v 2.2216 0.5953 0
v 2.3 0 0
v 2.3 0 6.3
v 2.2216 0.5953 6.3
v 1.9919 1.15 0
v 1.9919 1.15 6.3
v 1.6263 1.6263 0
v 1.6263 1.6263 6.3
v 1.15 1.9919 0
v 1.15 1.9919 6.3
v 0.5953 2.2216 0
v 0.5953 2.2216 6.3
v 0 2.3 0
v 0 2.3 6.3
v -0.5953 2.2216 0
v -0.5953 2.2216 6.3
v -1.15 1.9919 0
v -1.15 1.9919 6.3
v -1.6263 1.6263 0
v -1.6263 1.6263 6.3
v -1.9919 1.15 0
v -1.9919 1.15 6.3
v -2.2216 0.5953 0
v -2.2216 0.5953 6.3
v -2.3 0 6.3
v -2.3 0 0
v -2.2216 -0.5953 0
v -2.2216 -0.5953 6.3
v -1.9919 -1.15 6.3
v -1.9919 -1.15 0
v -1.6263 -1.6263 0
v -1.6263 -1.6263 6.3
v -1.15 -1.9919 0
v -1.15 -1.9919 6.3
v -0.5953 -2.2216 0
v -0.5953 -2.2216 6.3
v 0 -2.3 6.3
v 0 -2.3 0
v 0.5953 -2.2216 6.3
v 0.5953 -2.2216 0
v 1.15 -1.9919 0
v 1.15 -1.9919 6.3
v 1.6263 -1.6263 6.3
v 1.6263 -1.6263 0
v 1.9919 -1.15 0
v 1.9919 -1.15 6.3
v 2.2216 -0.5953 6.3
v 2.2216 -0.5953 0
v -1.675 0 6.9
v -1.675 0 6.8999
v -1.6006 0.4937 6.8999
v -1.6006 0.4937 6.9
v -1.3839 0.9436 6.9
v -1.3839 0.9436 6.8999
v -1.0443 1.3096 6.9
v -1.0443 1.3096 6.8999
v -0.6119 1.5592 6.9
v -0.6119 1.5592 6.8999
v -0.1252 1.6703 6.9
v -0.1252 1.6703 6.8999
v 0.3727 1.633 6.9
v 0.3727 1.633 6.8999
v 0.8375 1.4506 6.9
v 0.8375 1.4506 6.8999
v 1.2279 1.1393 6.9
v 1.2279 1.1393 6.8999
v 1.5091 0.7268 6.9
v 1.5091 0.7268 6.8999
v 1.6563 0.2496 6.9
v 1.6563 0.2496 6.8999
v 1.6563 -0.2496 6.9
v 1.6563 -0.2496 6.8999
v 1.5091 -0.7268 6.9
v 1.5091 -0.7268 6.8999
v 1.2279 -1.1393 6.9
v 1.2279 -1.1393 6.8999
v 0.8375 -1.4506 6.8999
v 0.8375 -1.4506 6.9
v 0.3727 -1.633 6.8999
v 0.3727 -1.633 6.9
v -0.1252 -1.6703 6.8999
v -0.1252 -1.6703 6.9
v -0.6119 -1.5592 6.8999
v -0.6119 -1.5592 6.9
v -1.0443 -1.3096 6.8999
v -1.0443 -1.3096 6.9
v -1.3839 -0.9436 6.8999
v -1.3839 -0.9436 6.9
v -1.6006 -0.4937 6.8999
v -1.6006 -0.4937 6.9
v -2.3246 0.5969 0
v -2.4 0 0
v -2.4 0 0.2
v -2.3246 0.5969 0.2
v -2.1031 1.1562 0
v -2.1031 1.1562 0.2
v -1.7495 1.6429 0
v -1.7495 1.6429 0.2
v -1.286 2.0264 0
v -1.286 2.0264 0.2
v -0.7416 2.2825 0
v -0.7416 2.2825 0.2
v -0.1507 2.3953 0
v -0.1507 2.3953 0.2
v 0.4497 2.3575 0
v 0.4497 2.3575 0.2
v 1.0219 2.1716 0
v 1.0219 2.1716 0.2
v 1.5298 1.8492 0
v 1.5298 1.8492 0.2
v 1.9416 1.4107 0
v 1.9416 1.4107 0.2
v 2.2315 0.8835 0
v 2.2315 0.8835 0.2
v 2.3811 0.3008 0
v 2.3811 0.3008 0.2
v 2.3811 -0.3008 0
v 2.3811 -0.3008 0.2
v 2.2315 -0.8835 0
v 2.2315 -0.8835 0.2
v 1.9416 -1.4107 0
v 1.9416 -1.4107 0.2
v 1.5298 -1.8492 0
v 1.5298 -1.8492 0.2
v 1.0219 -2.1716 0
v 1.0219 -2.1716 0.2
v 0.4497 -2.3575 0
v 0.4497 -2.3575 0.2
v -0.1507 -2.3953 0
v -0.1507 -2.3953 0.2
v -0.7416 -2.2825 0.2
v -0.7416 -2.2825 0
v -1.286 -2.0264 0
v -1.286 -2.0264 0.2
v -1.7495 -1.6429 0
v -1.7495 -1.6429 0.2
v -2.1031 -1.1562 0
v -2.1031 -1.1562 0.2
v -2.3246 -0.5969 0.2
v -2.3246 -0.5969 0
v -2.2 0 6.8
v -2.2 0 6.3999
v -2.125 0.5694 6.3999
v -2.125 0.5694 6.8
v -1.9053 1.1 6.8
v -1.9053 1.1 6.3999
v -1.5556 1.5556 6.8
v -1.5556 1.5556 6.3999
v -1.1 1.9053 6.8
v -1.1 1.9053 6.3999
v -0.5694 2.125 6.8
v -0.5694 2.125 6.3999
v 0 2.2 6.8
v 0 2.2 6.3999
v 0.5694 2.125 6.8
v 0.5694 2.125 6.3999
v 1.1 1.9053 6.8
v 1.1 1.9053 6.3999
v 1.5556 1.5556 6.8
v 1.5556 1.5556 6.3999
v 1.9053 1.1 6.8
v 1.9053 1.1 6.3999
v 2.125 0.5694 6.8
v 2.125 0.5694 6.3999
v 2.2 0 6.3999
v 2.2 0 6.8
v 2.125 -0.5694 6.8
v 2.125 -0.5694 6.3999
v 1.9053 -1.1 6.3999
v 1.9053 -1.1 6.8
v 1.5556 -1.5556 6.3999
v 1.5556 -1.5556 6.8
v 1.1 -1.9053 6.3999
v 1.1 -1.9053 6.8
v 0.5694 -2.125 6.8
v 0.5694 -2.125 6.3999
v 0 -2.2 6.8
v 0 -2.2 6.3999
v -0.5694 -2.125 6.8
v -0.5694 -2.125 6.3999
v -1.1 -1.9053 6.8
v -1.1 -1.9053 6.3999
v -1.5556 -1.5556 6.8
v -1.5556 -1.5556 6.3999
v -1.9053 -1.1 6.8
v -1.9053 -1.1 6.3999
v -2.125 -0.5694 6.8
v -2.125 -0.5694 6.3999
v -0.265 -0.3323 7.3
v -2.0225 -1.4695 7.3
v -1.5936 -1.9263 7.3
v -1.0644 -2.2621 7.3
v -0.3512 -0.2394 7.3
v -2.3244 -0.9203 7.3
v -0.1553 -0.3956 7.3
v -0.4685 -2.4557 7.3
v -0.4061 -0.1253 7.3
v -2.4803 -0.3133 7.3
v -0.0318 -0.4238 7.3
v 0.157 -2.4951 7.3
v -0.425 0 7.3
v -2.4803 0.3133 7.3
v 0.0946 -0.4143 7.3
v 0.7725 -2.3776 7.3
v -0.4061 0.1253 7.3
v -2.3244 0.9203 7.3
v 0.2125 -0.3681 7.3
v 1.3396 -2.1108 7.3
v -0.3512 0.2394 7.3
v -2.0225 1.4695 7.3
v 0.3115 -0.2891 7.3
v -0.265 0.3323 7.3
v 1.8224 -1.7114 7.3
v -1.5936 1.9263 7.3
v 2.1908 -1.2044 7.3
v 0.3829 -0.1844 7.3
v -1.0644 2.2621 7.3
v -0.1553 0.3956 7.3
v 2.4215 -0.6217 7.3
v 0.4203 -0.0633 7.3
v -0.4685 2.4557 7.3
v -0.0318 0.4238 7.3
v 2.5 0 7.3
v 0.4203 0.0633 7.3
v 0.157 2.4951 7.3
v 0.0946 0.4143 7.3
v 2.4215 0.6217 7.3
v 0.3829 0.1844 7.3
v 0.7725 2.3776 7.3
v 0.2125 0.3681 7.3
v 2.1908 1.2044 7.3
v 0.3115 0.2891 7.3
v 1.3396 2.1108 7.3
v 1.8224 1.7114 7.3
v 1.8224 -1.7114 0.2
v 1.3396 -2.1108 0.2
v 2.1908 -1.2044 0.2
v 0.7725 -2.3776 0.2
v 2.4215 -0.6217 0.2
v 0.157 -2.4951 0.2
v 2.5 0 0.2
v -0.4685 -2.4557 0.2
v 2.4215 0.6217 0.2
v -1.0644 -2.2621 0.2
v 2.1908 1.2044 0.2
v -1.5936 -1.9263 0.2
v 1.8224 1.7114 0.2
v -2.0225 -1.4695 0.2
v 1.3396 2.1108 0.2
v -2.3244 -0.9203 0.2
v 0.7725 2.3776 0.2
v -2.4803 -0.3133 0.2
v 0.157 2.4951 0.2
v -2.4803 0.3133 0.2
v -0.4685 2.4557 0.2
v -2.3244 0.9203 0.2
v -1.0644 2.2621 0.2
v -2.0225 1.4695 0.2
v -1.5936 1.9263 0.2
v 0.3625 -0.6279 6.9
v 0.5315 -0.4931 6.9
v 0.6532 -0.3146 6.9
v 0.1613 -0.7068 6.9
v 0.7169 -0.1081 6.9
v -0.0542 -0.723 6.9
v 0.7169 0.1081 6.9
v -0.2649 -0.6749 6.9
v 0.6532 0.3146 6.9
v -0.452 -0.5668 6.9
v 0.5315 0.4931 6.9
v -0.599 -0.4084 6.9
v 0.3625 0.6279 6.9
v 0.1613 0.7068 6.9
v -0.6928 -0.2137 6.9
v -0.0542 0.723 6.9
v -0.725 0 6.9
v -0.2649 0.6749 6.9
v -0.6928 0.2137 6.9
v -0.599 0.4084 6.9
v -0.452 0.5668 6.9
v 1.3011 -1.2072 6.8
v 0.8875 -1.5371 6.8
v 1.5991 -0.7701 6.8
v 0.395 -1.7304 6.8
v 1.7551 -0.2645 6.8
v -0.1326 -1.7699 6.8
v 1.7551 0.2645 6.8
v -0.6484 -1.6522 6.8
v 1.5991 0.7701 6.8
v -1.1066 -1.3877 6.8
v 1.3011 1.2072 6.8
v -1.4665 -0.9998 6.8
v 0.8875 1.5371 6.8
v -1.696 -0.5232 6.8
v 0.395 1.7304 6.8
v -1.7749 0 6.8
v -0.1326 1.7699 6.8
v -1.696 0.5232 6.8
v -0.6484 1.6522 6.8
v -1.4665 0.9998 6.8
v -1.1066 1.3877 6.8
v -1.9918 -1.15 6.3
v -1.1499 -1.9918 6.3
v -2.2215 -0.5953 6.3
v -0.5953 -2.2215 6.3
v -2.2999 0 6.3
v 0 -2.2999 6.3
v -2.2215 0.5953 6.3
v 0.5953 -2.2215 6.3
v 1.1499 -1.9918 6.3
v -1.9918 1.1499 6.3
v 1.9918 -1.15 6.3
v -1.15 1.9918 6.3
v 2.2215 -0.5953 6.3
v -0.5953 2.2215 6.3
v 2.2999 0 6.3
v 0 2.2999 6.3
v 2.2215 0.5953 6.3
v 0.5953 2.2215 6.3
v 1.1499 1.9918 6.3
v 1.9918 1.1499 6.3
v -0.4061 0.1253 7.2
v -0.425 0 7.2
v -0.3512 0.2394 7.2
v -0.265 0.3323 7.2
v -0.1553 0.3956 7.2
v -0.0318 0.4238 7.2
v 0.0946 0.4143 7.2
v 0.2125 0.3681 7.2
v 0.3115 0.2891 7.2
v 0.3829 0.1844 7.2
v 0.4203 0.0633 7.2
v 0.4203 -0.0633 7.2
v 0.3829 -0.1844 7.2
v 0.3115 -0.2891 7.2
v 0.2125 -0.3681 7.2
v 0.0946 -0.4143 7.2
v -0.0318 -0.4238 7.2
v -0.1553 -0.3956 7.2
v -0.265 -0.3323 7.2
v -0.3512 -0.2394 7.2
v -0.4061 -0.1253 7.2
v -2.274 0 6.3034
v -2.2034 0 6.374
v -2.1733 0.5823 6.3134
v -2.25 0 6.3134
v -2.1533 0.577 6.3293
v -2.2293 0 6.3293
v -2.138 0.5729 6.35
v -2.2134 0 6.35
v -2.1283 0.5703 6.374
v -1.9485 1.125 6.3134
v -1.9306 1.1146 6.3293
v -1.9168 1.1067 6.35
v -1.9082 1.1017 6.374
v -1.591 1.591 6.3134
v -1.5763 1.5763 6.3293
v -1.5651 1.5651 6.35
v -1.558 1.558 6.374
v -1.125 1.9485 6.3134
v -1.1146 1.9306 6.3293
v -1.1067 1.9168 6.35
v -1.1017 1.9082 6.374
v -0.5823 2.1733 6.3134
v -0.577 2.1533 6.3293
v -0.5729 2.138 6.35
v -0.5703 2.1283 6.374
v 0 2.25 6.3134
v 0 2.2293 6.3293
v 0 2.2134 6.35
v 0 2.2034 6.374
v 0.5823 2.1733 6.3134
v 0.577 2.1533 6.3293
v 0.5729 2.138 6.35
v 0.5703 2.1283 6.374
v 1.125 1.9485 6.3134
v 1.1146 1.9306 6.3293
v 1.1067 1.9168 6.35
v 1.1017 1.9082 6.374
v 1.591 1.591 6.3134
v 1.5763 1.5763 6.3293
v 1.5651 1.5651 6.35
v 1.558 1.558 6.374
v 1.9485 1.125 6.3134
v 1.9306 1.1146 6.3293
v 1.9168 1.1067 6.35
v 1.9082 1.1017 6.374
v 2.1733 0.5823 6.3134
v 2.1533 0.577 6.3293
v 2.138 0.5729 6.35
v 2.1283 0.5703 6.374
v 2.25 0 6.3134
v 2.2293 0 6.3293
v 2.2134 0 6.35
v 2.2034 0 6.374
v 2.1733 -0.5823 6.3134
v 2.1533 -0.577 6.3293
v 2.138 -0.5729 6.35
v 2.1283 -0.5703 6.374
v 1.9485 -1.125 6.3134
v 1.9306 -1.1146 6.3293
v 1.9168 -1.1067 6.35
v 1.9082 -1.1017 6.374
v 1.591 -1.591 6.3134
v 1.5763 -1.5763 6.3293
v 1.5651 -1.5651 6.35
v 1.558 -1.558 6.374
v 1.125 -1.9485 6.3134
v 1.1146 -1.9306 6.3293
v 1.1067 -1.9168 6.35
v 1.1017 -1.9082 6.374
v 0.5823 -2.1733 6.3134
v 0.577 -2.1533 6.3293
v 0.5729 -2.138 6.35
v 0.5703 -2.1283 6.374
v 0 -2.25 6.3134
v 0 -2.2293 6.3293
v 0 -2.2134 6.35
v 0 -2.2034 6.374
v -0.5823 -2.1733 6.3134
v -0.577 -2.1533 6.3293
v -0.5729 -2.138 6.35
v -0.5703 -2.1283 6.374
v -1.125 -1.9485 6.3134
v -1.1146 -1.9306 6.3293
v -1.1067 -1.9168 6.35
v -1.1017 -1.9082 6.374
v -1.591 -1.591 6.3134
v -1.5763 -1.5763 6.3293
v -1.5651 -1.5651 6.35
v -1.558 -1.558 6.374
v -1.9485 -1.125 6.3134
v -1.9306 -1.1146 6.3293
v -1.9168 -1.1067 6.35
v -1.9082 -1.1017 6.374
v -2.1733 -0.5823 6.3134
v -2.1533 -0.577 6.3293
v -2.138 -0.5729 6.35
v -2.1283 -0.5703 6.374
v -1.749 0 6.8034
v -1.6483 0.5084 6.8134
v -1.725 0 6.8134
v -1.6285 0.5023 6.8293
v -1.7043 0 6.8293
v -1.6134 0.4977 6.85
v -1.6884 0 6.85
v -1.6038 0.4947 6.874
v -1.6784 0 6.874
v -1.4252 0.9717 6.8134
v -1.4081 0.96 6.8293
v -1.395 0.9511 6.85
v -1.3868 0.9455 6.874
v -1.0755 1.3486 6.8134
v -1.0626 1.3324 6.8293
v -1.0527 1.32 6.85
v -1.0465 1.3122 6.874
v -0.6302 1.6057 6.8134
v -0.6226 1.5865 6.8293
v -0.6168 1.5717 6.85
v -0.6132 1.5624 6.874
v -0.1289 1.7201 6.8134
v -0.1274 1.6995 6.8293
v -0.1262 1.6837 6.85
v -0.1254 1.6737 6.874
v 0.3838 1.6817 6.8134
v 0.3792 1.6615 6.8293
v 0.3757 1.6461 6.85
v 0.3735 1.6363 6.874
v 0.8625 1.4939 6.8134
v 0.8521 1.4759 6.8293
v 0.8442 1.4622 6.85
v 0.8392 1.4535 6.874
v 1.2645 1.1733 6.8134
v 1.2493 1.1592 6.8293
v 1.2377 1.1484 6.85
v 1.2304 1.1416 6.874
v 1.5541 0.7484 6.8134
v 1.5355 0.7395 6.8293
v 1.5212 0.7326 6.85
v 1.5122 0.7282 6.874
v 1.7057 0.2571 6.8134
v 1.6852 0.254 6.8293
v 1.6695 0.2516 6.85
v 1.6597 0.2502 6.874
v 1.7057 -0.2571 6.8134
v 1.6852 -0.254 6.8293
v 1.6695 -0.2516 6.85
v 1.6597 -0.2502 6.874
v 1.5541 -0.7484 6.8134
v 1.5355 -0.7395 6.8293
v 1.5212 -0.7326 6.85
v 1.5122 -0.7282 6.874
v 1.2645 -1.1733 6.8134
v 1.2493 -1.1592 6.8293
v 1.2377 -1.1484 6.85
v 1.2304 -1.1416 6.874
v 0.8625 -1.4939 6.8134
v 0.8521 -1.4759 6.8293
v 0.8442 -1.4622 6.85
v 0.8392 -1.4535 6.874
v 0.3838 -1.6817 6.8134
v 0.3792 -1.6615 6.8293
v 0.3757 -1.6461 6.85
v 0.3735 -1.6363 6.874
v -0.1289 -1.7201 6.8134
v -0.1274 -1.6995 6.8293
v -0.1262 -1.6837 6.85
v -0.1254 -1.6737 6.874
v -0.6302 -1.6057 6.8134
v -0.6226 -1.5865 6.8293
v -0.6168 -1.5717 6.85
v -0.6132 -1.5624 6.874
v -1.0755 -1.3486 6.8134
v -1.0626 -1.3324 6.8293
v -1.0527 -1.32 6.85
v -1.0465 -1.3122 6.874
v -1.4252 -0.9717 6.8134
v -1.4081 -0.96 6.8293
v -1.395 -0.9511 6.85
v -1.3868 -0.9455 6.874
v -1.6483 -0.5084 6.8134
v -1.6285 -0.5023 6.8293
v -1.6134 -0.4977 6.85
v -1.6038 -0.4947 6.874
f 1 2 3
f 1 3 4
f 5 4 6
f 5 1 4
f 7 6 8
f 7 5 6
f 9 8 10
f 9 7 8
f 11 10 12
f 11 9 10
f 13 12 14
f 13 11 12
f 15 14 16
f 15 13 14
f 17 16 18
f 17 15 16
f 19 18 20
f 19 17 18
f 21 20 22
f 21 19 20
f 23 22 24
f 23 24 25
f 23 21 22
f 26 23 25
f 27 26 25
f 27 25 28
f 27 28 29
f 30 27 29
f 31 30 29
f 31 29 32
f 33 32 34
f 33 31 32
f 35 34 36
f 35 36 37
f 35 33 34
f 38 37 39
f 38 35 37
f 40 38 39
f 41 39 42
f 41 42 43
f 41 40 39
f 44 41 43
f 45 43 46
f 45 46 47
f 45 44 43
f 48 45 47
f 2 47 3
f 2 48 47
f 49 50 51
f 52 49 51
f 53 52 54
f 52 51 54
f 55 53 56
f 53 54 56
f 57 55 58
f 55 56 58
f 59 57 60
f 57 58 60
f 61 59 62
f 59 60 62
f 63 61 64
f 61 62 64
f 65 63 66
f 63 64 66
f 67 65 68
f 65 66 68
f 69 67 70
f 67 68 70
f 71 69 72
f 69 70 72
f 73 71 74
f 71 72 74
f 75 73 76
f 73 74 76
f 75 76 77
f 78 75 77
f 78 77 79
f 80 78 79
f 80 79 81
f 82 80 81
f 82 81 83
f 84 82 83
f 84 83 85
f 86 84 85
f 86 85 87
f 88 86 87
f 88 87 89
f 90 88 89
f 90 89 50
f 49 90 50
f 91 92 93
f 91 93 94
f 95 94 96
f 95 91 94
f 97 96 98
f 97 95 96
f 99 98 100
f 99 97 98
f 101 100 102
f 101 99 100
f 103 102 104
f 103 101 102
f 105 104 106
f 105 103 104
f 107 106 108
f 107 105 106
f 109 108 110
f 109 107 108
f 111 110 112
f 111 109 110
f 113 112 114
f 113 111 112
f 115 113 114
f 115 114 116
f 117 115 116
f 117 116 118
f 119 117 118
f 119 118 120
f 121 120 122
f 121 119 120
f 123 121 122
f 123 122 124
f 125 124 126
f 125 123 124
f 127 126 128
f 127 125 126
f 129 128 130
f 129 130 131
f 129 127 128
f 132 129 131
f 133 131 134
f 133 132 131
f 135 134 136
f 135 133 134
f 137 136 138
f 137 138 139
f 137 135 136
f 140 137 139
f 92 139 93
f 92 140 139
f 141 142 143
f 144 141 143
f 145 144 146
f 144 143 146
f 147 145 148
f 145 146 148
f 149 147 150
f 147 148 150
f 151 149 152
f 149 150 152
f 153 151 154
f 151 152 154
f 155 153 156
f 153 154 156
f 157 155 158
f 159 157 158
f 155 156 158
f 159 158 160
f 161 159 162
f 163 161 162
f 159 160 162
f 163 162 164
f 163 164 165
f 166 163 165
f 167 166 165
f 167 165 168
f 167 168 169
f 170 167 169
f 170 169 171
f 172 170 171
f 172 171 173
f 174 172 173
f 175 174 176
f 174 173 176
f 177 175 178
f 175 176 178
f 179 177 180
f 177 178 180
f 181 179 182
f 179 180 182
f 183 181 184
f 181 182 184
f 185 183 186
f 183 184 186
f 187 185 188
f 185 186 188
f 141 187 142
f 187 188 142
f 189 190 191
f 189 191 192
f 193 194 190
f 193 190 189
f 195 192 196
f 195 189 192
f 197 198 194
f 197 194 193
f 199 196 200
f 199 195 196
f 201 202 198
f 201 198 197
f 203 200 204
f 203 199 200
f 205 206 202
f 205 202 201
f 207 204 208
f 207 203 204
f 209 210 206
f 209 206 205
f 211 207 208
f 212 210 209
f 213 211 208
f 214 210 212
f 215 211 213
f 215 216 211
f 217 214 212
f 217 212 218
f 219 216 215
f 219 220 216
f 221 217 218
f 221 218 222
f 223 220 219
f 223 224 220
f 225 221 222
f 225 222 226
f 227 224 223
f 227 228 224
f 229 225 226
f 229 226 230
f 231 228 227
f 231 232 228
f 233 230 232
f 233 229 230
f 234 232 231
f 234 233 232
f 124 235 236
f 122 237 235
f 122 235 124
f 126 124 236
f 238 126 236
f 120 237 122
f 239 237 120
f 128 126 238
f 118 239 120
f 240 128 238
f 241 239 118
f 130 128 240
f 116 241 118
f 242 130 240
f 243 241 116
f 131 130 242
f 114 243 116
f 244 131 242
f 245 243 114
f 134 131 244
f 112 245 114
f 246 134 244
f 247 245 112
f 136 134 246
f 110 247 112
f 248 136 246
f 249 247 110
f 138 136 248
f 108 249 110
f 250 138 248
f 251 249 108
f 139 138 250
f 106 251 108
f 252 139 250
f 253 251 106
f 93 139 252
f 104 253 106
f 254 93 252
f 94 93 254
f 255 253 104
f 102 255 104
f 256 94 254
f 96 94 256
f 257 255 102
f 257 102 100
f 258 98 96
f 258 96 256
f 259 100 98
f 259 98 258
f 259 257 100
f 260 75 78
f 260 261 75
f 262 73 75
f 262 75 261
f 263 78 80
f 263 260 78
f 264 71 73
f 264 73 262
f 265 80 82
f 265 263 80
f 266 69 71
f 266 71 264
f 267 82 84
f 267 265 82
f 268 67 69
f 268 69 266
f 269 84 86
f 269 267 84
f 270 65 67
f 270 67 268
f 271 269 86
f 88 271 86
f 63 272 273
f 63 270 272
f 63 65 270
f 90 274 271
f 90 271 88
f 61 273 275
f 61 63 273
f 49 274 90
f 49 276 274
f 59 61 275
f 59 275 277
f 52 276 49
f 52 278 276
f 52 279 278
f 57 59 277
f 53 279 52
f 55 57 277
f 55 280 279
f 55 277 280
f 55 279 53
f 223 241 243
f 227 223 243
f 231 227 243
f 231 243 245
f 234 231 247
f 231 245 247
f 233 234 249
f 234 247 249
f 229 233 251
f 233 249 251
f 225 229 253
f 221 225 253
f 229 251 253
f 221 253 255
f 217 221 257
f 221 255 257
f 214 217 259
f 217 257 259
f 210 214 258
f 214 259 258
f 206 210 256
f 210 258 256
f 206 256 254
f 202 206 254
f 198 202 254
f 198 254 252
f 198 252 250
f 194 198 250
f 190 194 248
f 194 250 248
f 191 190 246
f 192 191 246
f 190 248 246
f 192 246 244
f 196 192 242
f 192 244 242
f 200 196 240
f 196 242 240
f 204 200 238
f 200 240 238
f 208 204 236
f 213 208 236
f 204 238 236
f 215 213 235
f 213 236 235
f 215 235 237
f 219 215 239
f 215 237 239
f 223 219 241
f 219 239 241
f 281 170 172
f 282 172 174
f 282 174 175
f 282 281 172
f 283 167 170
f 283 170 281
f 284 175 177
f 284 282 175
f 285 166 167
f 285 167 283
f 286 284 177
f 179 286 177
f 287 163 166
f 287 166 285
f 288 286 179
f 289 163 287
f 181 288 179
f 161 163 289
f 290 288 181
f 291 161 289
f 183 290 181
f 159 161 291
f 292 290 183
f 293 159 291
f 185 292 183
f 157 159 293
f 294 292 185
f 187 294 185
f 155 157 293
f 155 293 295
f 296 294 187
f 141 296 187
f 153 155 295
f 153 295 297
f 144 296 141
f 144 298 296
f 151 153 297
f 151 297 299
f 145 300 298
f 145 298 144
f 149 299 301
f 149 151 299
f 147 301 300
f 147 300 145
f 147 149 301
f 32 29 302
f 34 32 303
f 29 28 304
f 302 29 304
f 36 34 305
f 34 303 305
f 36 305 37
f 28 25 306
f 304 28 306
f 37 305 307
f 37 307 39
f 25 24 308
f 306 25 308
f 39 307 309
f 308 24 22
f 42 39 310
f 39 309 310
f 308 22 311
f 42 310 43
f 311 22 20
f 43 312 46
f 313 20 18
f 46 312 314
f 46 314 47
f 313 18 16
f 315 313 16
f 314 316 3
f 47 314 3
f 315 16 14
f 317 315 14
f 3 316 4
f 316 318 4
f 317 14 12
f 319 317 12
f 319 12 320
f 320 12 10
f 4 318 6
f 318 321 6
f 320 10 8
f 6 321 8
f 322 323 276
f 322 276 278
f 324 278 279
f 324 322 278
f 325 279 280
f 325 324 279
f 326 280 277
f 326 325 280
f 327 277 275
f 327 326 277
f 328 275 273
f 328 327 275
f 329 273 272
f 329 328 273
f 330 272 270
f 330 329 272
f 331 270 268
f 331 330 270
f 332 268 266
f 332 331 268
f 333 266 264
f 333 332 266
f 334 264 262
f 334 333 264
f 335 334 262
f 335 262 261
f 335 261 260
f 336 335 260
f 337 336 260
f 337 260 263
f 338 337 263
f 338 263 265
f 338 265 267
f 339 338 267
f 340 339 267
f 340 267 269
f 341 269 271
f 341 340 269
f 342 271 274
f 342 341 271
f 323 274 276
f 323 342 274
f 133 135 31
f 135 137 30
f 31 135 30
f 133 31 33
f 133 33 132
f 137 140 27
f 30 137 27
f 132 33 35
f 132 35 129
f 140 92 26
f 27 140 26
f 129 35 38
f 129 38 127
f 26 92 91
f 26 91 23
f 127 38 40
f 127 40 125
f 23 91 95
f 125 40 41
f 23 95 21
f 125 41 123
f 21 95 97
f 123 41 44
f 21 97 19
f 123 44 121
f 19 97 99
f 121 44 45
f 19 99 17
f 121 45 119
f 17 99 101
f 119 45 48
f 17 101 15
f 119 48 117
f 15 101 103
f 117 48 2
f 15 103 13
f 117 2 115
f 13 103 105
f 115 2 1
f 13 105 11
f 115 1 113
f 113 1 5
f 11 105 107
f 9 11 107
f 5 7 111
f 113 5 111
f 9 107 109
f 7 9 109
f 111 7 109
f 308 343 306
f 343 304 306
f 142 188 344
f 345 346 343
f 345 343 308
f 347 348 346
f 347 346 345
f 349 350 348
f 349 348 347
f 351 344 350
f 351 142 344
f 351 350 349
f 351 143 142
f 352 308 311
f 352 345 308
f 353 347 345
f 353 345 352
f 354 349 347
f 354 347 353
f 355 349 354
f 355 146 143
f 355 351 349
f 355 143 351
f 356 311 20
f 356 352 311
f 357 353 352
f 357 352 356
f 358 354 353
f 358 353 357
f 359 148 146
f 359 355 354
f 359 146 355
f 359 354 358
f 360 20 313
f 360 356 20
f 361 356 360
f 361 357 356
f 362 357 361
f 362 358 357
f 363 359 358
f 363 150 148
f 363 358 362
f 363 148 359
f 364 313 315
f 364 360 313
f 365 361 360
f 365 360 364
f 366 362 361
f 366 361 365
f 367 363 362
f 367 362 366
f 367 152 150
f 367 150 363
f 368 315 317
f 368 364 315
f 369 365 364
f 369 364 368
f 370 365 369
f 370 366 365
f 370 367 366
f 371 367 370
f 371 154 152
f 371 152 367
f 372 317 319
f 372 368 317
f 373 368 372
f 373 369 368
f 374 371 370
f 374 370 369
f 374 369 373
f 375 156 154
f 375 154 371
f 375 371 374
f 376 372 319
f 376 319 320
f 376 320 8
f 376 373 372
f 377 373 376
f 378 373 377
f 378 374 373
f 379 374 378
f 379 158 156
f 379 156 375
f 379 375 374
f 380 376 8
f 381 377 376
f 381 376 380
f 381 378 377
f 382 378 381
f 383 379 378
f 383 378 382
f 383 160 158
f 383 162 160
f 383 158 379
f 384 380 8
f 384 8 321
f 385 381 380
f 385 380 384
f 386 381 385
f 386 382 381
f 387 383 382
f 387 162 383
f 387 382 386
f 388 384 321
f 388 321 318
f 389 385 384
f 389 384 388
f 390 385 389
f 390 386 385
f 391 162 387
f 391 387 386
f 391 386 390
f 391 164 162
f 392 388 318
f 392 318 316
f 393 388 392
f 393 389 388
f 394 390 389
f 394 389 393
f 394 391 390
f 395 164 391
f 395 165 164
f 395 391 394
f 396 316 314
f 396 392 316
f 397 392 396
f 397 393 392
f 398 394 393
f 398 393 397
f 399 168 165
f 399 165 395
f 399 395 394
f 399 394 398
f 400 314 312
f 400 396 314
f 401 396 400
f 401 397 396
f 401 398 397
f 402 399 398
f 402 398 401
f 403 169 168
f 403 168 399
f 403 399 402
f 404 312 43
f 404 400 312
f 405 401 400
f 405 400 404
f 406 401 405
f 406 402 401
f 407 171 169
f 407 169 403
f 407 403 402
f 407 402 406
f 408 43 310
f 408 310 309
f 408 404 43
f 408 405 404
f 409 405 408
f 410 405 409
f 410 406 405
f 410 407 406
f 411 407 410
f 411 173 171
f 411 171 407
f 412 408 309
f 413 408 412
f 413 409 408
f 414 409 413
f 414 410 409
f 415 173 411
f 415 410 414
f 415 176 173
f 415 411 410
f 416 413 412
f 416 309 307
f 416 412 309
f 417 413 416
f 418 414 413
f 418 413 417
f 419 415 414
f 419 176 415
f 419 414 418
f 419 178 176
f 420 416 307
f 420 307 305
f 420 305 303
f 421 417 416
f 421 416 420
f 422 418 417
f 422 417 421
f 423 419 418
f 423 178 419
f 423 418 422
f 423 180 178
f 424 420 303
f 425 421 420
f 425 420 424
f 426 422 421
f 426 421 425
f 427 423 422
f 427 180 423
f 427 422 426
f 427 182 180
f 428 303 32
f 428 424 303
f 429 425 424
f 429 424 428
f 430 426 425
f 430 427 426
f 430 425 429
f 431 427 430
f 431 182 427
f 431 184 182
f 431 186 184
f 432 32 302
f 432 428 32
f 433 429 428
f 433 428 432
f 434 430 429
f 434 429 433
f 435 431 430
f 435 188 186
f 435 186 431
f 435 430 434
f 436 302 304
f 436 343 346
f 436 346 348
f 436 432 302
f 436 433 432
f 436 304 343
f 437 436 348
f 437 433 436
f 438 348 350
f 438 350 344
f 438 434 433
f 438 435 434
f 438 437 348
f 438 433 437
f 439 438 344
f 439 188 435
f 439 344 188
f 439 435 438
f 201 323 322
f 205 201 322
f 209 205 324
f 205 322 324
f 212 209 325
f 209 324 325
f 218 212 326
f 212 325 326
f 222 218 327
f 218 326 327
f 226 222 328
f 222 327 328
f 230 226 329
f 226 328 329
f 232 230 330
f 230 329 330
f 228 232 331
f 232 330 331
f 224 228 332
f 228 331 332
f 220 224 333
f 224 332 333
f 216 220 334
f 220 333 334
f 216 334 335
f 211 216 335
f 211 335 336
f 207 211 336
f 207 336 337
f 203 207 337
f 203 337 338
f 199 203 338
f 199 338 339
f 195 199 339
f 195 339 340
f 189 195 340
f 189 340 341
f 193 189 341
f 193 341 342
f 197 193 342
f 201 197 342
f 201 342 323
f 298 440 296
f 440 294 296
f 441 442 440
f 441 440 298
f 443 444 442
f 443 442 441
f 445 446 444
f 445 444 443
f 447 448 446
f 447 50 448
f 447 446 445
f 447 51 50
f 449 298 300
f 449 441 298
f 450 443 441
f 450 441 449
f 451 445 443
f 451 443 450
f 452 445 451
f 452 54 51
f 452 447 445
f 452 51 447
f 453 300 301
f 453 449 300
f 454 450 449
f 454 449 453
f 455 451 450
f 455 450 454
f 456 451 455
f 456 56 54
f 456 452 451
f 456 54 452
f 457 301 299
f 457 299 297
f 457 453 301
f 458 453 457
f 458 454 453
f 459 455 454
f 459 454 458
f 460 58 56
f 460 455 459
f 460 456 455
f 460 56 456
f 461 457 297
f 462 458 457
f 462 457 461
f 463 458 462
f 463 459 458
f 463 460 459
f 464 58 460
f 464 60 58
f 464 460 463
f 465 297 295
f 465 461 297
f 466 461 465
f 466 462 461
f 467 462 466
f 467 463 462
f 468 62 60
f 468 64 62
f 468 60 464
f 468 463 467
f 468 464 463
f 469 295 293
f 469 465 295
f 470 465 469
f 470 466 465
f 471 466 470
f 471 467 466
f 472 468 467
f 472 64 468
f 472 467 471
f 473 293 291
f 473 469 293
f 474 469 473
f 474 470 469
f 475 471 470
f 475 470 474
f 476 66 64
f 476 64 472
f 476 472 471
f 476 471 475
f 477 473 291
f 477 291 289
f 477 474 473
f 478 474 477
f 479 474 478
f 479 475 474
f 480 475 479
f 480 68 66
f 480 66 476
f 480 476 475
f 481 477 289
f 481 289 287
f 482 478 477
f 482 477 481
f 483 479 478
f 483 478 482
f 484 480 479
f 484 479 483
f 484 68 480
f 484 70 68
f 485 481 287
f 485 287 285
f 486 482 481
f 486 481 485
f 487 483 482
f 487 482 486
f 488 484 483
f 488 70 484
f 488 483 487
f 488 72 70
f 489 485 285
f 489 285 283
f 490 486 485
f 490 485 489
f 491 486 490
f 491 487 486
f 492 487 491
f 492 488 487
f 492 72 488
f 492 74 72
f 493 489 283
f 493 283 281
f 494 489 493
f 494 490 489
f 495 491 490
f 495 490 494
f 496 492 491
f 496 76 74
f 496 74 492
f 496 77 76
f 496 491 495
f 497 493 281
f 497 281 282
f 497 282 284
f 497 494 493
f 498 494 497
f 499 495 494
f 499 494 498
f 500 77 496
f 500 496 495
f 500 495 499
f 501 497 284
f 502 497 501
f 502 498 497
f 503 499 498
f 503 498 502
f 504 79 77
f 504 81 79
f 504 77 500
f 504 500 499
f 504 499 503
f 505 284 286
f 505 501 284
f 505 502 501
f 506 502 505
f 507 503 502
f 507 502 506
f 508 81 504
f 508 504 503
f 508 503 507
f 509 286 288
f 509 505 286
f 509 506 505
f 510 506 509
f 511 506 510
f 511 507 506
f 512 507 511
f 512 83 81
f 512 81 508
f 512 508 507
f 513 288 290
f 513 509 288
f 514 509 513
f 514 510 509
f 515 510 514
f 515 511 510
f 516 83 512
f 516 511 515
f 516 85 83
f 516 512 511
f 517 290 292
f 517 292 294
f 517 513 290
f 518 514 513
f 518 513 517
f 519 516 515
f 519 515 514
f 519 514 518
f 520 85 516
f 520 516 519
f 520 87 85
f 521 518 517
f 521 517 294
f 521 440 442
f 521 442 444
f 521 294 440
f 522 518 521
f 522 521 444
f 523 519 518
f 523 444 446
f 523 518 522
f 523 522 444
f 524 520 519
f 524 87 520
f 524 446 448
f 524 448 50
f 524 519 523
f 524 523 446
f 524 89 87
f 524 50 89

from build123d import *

# Parameters (mm, degrees)
SKETCH_1_R          = 2.5
SKETCH_1_R_2        = 2.3
EXTRUDE_1_DEPTH     = 6.3
SKETCH_2_R          = 2.5
EXTRUDE_2_DEPTH     = 1
SKETCH_4_R          = 0.425
CUT_EXTRUDE_1_DEPTH = 8.224264668
SKETCH_5_R          = 1.675
CUT_EXTRUDE_2_DEPTH = 0.6
SKETCH_6_R          = 2.2
CUT_EXTRUDE_3_DEPTH = 0.5
FILLET_1_R          = 0.1
FILLET_2_R          = 0.1
CHAMFER_2_SIZE      = 0.3
SKETCH_9_R          = 2.5
SKETCH_9_R_2        = 2.4
CUT_EXTRUDE_4_DEPTH = 0.2


with BuildPart() as part:
    # 스케치1 → 보스-돌출1 (new body)
    with BuildSketch(Plane.XY):
        Circle(SKETCH_1_R)
        Circle(SKETCH_1_R_2, mode=Mode.SUBTRACT)
    extrude(amount=EXTRUDE_1_DEPTH)

    # 스케치2 → 보스-돌출2 (add)
    with BuildSketch(Plane.XY.offset(6.3)):
        Circle(SKETCH_2_R)
    extrude(amount=EXTRUDE_2_DEPTH)

    # 스케치4 → 컷-돌출1 (cut, through all)
    with BuildSketch(Plane(origin=(0, 0, 6.3), x_dir=(-1, 0, 0), z_dir=(0, 0, -1))):
        Circle(SKETCH_4_R)
    extrude(amount=-CUT_EXTRUDE_1_DEPTH, mode=Mode.SUBTRACT)

    # 스케치5 → 컷-돌출2 (cut)
    with BuildSketch(Plane(origin=(0, 0, 6.3), x_dir=(-1, 0, 0), z_dir=(0, 0, -1))):
        Circle(SKETCH_5_R)
    extrude(amount=-CUT_EXTRUDE_2_DEPTH, mode=Mode.SUBTRACT)

    # 스케치6 → 컷-돌출3 (cut)
    with BuildSketch(Plane(origin=(0, 0, 6.3), x_dir=(-1, 0, 0), z_dir=(0, 0, -1))):
        Circle(SKETCH_6_R)
    extrude(amount=-CUT_EXTRUDE_3_DEPTH, mode=Mode.SUBTRACT)

    # 필렛1
    fillet_1_edges = [part.edges().sort_by_distance(p)[0] for p in [
        (2.2, 0, 6.3),
    ]]
    fillet(fillet_1_edges, radius=FILLET_1_R - 0.0001)  # a hair under: the kernel refuses the full size

    # 필렛2
    fillet_2_edges = [part.edges().sort_by_distance(p)[0] for p in [
        (1.675, 0, 6.8),
    ]]
    fillet(fillet_2_edges, radius=FILLET_2_R - 0.0001)  # a hair under: the kernel refuses the full size

    # 모따기2
    chamfer_2_edges = [part.edges().sort_by_distance(p)[0] for p in [
        (0.425, 0, 6.9),
    ]]
    chamfer(chamfer_2_edges, length=CHAMFER_2_SIZE)

    # 스케치9 → 컷-돌출4 (cut)
    with BuildSketch(Plane(origin=(0, 0, 0), x_dir=(-1, 0, 0), z_dir=(0, 0, -1))):
        Circle(SKETCH_9_R)
        Circle(SKETCH_9_R_2, mode=Mode.SUBTRACT)
    extrude(amount=-CUT_EXTRUDE_4_DEPTH, mode=Mode.SUBTRACT)


solid = part.part
